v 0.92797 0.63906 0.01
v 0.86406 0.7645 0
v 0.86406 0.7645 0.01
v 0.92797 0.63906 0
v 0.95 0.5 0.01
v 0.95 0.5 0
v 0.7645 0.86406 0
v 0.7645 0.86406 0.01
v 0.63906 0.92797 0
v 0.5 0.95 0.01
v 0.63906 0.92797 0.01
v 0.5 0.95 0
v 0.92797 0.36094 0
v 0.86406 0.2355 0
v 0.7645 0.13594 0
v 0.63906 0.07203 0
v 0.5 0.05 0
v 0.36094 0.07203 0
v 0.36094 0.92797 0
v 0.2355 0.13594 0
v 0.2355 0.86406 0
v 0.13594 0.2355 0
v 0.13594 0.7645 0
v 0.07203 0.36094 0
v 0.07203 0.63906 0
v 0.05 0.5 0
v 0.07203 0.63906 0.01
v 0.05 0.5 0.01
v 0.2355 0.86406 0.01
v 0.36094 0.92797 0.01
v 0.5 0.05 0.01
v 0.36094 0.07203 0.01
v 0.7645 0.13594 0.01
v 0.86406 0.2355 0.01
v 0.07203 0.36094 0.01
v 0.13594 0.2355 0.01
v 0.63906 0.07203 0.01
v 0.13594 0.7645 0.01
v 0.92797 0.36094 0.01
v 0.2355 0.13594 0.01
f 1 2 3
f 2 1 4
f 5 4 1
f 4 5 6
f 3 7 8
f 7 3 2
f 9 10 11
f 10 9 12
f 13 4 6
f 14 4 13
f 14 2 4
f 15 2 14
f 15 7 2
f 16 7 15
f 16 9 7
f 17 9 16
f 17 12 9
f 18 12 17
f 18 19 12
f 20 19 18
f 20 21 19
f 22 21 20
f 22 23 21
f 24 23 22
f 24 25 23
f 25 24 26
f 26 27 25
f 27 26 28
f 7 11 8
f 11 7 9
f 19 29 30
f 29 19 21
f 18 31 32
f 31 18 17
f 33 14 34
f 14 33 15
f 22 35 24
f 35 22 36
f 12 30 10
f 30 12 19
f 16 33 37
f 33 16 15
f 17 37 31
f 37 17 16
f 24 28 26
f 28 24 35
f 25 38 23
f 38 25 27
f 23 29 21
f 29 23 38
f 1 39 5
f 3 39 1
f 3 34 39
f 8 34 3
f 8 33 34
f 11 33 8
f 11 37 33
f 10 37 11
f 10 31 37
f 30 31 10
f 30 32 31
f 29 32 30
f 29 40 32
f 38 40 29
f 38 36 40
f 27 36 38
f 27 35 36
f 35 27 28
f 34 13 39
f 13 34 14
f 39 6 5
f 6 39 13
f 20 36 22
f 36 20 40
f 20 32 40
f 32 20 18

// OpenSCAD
module theGoal(){
  color([1,0,0])
  render(convexity=1)
  translate([0.5,0.5,0])
  cylinder(d=0.7,h=0.01,$fn=20);

  gray=0.8;
  color([gray,gray,gray])
  render(convexity=5)
  translate([0.5,0.5,0])
  difference(){
    cylinder(d=0.9,h=0.01,$fn=20);
    cylinder(d=0.7,h=0.01,$fn=20);
  }
}

theGoal();
